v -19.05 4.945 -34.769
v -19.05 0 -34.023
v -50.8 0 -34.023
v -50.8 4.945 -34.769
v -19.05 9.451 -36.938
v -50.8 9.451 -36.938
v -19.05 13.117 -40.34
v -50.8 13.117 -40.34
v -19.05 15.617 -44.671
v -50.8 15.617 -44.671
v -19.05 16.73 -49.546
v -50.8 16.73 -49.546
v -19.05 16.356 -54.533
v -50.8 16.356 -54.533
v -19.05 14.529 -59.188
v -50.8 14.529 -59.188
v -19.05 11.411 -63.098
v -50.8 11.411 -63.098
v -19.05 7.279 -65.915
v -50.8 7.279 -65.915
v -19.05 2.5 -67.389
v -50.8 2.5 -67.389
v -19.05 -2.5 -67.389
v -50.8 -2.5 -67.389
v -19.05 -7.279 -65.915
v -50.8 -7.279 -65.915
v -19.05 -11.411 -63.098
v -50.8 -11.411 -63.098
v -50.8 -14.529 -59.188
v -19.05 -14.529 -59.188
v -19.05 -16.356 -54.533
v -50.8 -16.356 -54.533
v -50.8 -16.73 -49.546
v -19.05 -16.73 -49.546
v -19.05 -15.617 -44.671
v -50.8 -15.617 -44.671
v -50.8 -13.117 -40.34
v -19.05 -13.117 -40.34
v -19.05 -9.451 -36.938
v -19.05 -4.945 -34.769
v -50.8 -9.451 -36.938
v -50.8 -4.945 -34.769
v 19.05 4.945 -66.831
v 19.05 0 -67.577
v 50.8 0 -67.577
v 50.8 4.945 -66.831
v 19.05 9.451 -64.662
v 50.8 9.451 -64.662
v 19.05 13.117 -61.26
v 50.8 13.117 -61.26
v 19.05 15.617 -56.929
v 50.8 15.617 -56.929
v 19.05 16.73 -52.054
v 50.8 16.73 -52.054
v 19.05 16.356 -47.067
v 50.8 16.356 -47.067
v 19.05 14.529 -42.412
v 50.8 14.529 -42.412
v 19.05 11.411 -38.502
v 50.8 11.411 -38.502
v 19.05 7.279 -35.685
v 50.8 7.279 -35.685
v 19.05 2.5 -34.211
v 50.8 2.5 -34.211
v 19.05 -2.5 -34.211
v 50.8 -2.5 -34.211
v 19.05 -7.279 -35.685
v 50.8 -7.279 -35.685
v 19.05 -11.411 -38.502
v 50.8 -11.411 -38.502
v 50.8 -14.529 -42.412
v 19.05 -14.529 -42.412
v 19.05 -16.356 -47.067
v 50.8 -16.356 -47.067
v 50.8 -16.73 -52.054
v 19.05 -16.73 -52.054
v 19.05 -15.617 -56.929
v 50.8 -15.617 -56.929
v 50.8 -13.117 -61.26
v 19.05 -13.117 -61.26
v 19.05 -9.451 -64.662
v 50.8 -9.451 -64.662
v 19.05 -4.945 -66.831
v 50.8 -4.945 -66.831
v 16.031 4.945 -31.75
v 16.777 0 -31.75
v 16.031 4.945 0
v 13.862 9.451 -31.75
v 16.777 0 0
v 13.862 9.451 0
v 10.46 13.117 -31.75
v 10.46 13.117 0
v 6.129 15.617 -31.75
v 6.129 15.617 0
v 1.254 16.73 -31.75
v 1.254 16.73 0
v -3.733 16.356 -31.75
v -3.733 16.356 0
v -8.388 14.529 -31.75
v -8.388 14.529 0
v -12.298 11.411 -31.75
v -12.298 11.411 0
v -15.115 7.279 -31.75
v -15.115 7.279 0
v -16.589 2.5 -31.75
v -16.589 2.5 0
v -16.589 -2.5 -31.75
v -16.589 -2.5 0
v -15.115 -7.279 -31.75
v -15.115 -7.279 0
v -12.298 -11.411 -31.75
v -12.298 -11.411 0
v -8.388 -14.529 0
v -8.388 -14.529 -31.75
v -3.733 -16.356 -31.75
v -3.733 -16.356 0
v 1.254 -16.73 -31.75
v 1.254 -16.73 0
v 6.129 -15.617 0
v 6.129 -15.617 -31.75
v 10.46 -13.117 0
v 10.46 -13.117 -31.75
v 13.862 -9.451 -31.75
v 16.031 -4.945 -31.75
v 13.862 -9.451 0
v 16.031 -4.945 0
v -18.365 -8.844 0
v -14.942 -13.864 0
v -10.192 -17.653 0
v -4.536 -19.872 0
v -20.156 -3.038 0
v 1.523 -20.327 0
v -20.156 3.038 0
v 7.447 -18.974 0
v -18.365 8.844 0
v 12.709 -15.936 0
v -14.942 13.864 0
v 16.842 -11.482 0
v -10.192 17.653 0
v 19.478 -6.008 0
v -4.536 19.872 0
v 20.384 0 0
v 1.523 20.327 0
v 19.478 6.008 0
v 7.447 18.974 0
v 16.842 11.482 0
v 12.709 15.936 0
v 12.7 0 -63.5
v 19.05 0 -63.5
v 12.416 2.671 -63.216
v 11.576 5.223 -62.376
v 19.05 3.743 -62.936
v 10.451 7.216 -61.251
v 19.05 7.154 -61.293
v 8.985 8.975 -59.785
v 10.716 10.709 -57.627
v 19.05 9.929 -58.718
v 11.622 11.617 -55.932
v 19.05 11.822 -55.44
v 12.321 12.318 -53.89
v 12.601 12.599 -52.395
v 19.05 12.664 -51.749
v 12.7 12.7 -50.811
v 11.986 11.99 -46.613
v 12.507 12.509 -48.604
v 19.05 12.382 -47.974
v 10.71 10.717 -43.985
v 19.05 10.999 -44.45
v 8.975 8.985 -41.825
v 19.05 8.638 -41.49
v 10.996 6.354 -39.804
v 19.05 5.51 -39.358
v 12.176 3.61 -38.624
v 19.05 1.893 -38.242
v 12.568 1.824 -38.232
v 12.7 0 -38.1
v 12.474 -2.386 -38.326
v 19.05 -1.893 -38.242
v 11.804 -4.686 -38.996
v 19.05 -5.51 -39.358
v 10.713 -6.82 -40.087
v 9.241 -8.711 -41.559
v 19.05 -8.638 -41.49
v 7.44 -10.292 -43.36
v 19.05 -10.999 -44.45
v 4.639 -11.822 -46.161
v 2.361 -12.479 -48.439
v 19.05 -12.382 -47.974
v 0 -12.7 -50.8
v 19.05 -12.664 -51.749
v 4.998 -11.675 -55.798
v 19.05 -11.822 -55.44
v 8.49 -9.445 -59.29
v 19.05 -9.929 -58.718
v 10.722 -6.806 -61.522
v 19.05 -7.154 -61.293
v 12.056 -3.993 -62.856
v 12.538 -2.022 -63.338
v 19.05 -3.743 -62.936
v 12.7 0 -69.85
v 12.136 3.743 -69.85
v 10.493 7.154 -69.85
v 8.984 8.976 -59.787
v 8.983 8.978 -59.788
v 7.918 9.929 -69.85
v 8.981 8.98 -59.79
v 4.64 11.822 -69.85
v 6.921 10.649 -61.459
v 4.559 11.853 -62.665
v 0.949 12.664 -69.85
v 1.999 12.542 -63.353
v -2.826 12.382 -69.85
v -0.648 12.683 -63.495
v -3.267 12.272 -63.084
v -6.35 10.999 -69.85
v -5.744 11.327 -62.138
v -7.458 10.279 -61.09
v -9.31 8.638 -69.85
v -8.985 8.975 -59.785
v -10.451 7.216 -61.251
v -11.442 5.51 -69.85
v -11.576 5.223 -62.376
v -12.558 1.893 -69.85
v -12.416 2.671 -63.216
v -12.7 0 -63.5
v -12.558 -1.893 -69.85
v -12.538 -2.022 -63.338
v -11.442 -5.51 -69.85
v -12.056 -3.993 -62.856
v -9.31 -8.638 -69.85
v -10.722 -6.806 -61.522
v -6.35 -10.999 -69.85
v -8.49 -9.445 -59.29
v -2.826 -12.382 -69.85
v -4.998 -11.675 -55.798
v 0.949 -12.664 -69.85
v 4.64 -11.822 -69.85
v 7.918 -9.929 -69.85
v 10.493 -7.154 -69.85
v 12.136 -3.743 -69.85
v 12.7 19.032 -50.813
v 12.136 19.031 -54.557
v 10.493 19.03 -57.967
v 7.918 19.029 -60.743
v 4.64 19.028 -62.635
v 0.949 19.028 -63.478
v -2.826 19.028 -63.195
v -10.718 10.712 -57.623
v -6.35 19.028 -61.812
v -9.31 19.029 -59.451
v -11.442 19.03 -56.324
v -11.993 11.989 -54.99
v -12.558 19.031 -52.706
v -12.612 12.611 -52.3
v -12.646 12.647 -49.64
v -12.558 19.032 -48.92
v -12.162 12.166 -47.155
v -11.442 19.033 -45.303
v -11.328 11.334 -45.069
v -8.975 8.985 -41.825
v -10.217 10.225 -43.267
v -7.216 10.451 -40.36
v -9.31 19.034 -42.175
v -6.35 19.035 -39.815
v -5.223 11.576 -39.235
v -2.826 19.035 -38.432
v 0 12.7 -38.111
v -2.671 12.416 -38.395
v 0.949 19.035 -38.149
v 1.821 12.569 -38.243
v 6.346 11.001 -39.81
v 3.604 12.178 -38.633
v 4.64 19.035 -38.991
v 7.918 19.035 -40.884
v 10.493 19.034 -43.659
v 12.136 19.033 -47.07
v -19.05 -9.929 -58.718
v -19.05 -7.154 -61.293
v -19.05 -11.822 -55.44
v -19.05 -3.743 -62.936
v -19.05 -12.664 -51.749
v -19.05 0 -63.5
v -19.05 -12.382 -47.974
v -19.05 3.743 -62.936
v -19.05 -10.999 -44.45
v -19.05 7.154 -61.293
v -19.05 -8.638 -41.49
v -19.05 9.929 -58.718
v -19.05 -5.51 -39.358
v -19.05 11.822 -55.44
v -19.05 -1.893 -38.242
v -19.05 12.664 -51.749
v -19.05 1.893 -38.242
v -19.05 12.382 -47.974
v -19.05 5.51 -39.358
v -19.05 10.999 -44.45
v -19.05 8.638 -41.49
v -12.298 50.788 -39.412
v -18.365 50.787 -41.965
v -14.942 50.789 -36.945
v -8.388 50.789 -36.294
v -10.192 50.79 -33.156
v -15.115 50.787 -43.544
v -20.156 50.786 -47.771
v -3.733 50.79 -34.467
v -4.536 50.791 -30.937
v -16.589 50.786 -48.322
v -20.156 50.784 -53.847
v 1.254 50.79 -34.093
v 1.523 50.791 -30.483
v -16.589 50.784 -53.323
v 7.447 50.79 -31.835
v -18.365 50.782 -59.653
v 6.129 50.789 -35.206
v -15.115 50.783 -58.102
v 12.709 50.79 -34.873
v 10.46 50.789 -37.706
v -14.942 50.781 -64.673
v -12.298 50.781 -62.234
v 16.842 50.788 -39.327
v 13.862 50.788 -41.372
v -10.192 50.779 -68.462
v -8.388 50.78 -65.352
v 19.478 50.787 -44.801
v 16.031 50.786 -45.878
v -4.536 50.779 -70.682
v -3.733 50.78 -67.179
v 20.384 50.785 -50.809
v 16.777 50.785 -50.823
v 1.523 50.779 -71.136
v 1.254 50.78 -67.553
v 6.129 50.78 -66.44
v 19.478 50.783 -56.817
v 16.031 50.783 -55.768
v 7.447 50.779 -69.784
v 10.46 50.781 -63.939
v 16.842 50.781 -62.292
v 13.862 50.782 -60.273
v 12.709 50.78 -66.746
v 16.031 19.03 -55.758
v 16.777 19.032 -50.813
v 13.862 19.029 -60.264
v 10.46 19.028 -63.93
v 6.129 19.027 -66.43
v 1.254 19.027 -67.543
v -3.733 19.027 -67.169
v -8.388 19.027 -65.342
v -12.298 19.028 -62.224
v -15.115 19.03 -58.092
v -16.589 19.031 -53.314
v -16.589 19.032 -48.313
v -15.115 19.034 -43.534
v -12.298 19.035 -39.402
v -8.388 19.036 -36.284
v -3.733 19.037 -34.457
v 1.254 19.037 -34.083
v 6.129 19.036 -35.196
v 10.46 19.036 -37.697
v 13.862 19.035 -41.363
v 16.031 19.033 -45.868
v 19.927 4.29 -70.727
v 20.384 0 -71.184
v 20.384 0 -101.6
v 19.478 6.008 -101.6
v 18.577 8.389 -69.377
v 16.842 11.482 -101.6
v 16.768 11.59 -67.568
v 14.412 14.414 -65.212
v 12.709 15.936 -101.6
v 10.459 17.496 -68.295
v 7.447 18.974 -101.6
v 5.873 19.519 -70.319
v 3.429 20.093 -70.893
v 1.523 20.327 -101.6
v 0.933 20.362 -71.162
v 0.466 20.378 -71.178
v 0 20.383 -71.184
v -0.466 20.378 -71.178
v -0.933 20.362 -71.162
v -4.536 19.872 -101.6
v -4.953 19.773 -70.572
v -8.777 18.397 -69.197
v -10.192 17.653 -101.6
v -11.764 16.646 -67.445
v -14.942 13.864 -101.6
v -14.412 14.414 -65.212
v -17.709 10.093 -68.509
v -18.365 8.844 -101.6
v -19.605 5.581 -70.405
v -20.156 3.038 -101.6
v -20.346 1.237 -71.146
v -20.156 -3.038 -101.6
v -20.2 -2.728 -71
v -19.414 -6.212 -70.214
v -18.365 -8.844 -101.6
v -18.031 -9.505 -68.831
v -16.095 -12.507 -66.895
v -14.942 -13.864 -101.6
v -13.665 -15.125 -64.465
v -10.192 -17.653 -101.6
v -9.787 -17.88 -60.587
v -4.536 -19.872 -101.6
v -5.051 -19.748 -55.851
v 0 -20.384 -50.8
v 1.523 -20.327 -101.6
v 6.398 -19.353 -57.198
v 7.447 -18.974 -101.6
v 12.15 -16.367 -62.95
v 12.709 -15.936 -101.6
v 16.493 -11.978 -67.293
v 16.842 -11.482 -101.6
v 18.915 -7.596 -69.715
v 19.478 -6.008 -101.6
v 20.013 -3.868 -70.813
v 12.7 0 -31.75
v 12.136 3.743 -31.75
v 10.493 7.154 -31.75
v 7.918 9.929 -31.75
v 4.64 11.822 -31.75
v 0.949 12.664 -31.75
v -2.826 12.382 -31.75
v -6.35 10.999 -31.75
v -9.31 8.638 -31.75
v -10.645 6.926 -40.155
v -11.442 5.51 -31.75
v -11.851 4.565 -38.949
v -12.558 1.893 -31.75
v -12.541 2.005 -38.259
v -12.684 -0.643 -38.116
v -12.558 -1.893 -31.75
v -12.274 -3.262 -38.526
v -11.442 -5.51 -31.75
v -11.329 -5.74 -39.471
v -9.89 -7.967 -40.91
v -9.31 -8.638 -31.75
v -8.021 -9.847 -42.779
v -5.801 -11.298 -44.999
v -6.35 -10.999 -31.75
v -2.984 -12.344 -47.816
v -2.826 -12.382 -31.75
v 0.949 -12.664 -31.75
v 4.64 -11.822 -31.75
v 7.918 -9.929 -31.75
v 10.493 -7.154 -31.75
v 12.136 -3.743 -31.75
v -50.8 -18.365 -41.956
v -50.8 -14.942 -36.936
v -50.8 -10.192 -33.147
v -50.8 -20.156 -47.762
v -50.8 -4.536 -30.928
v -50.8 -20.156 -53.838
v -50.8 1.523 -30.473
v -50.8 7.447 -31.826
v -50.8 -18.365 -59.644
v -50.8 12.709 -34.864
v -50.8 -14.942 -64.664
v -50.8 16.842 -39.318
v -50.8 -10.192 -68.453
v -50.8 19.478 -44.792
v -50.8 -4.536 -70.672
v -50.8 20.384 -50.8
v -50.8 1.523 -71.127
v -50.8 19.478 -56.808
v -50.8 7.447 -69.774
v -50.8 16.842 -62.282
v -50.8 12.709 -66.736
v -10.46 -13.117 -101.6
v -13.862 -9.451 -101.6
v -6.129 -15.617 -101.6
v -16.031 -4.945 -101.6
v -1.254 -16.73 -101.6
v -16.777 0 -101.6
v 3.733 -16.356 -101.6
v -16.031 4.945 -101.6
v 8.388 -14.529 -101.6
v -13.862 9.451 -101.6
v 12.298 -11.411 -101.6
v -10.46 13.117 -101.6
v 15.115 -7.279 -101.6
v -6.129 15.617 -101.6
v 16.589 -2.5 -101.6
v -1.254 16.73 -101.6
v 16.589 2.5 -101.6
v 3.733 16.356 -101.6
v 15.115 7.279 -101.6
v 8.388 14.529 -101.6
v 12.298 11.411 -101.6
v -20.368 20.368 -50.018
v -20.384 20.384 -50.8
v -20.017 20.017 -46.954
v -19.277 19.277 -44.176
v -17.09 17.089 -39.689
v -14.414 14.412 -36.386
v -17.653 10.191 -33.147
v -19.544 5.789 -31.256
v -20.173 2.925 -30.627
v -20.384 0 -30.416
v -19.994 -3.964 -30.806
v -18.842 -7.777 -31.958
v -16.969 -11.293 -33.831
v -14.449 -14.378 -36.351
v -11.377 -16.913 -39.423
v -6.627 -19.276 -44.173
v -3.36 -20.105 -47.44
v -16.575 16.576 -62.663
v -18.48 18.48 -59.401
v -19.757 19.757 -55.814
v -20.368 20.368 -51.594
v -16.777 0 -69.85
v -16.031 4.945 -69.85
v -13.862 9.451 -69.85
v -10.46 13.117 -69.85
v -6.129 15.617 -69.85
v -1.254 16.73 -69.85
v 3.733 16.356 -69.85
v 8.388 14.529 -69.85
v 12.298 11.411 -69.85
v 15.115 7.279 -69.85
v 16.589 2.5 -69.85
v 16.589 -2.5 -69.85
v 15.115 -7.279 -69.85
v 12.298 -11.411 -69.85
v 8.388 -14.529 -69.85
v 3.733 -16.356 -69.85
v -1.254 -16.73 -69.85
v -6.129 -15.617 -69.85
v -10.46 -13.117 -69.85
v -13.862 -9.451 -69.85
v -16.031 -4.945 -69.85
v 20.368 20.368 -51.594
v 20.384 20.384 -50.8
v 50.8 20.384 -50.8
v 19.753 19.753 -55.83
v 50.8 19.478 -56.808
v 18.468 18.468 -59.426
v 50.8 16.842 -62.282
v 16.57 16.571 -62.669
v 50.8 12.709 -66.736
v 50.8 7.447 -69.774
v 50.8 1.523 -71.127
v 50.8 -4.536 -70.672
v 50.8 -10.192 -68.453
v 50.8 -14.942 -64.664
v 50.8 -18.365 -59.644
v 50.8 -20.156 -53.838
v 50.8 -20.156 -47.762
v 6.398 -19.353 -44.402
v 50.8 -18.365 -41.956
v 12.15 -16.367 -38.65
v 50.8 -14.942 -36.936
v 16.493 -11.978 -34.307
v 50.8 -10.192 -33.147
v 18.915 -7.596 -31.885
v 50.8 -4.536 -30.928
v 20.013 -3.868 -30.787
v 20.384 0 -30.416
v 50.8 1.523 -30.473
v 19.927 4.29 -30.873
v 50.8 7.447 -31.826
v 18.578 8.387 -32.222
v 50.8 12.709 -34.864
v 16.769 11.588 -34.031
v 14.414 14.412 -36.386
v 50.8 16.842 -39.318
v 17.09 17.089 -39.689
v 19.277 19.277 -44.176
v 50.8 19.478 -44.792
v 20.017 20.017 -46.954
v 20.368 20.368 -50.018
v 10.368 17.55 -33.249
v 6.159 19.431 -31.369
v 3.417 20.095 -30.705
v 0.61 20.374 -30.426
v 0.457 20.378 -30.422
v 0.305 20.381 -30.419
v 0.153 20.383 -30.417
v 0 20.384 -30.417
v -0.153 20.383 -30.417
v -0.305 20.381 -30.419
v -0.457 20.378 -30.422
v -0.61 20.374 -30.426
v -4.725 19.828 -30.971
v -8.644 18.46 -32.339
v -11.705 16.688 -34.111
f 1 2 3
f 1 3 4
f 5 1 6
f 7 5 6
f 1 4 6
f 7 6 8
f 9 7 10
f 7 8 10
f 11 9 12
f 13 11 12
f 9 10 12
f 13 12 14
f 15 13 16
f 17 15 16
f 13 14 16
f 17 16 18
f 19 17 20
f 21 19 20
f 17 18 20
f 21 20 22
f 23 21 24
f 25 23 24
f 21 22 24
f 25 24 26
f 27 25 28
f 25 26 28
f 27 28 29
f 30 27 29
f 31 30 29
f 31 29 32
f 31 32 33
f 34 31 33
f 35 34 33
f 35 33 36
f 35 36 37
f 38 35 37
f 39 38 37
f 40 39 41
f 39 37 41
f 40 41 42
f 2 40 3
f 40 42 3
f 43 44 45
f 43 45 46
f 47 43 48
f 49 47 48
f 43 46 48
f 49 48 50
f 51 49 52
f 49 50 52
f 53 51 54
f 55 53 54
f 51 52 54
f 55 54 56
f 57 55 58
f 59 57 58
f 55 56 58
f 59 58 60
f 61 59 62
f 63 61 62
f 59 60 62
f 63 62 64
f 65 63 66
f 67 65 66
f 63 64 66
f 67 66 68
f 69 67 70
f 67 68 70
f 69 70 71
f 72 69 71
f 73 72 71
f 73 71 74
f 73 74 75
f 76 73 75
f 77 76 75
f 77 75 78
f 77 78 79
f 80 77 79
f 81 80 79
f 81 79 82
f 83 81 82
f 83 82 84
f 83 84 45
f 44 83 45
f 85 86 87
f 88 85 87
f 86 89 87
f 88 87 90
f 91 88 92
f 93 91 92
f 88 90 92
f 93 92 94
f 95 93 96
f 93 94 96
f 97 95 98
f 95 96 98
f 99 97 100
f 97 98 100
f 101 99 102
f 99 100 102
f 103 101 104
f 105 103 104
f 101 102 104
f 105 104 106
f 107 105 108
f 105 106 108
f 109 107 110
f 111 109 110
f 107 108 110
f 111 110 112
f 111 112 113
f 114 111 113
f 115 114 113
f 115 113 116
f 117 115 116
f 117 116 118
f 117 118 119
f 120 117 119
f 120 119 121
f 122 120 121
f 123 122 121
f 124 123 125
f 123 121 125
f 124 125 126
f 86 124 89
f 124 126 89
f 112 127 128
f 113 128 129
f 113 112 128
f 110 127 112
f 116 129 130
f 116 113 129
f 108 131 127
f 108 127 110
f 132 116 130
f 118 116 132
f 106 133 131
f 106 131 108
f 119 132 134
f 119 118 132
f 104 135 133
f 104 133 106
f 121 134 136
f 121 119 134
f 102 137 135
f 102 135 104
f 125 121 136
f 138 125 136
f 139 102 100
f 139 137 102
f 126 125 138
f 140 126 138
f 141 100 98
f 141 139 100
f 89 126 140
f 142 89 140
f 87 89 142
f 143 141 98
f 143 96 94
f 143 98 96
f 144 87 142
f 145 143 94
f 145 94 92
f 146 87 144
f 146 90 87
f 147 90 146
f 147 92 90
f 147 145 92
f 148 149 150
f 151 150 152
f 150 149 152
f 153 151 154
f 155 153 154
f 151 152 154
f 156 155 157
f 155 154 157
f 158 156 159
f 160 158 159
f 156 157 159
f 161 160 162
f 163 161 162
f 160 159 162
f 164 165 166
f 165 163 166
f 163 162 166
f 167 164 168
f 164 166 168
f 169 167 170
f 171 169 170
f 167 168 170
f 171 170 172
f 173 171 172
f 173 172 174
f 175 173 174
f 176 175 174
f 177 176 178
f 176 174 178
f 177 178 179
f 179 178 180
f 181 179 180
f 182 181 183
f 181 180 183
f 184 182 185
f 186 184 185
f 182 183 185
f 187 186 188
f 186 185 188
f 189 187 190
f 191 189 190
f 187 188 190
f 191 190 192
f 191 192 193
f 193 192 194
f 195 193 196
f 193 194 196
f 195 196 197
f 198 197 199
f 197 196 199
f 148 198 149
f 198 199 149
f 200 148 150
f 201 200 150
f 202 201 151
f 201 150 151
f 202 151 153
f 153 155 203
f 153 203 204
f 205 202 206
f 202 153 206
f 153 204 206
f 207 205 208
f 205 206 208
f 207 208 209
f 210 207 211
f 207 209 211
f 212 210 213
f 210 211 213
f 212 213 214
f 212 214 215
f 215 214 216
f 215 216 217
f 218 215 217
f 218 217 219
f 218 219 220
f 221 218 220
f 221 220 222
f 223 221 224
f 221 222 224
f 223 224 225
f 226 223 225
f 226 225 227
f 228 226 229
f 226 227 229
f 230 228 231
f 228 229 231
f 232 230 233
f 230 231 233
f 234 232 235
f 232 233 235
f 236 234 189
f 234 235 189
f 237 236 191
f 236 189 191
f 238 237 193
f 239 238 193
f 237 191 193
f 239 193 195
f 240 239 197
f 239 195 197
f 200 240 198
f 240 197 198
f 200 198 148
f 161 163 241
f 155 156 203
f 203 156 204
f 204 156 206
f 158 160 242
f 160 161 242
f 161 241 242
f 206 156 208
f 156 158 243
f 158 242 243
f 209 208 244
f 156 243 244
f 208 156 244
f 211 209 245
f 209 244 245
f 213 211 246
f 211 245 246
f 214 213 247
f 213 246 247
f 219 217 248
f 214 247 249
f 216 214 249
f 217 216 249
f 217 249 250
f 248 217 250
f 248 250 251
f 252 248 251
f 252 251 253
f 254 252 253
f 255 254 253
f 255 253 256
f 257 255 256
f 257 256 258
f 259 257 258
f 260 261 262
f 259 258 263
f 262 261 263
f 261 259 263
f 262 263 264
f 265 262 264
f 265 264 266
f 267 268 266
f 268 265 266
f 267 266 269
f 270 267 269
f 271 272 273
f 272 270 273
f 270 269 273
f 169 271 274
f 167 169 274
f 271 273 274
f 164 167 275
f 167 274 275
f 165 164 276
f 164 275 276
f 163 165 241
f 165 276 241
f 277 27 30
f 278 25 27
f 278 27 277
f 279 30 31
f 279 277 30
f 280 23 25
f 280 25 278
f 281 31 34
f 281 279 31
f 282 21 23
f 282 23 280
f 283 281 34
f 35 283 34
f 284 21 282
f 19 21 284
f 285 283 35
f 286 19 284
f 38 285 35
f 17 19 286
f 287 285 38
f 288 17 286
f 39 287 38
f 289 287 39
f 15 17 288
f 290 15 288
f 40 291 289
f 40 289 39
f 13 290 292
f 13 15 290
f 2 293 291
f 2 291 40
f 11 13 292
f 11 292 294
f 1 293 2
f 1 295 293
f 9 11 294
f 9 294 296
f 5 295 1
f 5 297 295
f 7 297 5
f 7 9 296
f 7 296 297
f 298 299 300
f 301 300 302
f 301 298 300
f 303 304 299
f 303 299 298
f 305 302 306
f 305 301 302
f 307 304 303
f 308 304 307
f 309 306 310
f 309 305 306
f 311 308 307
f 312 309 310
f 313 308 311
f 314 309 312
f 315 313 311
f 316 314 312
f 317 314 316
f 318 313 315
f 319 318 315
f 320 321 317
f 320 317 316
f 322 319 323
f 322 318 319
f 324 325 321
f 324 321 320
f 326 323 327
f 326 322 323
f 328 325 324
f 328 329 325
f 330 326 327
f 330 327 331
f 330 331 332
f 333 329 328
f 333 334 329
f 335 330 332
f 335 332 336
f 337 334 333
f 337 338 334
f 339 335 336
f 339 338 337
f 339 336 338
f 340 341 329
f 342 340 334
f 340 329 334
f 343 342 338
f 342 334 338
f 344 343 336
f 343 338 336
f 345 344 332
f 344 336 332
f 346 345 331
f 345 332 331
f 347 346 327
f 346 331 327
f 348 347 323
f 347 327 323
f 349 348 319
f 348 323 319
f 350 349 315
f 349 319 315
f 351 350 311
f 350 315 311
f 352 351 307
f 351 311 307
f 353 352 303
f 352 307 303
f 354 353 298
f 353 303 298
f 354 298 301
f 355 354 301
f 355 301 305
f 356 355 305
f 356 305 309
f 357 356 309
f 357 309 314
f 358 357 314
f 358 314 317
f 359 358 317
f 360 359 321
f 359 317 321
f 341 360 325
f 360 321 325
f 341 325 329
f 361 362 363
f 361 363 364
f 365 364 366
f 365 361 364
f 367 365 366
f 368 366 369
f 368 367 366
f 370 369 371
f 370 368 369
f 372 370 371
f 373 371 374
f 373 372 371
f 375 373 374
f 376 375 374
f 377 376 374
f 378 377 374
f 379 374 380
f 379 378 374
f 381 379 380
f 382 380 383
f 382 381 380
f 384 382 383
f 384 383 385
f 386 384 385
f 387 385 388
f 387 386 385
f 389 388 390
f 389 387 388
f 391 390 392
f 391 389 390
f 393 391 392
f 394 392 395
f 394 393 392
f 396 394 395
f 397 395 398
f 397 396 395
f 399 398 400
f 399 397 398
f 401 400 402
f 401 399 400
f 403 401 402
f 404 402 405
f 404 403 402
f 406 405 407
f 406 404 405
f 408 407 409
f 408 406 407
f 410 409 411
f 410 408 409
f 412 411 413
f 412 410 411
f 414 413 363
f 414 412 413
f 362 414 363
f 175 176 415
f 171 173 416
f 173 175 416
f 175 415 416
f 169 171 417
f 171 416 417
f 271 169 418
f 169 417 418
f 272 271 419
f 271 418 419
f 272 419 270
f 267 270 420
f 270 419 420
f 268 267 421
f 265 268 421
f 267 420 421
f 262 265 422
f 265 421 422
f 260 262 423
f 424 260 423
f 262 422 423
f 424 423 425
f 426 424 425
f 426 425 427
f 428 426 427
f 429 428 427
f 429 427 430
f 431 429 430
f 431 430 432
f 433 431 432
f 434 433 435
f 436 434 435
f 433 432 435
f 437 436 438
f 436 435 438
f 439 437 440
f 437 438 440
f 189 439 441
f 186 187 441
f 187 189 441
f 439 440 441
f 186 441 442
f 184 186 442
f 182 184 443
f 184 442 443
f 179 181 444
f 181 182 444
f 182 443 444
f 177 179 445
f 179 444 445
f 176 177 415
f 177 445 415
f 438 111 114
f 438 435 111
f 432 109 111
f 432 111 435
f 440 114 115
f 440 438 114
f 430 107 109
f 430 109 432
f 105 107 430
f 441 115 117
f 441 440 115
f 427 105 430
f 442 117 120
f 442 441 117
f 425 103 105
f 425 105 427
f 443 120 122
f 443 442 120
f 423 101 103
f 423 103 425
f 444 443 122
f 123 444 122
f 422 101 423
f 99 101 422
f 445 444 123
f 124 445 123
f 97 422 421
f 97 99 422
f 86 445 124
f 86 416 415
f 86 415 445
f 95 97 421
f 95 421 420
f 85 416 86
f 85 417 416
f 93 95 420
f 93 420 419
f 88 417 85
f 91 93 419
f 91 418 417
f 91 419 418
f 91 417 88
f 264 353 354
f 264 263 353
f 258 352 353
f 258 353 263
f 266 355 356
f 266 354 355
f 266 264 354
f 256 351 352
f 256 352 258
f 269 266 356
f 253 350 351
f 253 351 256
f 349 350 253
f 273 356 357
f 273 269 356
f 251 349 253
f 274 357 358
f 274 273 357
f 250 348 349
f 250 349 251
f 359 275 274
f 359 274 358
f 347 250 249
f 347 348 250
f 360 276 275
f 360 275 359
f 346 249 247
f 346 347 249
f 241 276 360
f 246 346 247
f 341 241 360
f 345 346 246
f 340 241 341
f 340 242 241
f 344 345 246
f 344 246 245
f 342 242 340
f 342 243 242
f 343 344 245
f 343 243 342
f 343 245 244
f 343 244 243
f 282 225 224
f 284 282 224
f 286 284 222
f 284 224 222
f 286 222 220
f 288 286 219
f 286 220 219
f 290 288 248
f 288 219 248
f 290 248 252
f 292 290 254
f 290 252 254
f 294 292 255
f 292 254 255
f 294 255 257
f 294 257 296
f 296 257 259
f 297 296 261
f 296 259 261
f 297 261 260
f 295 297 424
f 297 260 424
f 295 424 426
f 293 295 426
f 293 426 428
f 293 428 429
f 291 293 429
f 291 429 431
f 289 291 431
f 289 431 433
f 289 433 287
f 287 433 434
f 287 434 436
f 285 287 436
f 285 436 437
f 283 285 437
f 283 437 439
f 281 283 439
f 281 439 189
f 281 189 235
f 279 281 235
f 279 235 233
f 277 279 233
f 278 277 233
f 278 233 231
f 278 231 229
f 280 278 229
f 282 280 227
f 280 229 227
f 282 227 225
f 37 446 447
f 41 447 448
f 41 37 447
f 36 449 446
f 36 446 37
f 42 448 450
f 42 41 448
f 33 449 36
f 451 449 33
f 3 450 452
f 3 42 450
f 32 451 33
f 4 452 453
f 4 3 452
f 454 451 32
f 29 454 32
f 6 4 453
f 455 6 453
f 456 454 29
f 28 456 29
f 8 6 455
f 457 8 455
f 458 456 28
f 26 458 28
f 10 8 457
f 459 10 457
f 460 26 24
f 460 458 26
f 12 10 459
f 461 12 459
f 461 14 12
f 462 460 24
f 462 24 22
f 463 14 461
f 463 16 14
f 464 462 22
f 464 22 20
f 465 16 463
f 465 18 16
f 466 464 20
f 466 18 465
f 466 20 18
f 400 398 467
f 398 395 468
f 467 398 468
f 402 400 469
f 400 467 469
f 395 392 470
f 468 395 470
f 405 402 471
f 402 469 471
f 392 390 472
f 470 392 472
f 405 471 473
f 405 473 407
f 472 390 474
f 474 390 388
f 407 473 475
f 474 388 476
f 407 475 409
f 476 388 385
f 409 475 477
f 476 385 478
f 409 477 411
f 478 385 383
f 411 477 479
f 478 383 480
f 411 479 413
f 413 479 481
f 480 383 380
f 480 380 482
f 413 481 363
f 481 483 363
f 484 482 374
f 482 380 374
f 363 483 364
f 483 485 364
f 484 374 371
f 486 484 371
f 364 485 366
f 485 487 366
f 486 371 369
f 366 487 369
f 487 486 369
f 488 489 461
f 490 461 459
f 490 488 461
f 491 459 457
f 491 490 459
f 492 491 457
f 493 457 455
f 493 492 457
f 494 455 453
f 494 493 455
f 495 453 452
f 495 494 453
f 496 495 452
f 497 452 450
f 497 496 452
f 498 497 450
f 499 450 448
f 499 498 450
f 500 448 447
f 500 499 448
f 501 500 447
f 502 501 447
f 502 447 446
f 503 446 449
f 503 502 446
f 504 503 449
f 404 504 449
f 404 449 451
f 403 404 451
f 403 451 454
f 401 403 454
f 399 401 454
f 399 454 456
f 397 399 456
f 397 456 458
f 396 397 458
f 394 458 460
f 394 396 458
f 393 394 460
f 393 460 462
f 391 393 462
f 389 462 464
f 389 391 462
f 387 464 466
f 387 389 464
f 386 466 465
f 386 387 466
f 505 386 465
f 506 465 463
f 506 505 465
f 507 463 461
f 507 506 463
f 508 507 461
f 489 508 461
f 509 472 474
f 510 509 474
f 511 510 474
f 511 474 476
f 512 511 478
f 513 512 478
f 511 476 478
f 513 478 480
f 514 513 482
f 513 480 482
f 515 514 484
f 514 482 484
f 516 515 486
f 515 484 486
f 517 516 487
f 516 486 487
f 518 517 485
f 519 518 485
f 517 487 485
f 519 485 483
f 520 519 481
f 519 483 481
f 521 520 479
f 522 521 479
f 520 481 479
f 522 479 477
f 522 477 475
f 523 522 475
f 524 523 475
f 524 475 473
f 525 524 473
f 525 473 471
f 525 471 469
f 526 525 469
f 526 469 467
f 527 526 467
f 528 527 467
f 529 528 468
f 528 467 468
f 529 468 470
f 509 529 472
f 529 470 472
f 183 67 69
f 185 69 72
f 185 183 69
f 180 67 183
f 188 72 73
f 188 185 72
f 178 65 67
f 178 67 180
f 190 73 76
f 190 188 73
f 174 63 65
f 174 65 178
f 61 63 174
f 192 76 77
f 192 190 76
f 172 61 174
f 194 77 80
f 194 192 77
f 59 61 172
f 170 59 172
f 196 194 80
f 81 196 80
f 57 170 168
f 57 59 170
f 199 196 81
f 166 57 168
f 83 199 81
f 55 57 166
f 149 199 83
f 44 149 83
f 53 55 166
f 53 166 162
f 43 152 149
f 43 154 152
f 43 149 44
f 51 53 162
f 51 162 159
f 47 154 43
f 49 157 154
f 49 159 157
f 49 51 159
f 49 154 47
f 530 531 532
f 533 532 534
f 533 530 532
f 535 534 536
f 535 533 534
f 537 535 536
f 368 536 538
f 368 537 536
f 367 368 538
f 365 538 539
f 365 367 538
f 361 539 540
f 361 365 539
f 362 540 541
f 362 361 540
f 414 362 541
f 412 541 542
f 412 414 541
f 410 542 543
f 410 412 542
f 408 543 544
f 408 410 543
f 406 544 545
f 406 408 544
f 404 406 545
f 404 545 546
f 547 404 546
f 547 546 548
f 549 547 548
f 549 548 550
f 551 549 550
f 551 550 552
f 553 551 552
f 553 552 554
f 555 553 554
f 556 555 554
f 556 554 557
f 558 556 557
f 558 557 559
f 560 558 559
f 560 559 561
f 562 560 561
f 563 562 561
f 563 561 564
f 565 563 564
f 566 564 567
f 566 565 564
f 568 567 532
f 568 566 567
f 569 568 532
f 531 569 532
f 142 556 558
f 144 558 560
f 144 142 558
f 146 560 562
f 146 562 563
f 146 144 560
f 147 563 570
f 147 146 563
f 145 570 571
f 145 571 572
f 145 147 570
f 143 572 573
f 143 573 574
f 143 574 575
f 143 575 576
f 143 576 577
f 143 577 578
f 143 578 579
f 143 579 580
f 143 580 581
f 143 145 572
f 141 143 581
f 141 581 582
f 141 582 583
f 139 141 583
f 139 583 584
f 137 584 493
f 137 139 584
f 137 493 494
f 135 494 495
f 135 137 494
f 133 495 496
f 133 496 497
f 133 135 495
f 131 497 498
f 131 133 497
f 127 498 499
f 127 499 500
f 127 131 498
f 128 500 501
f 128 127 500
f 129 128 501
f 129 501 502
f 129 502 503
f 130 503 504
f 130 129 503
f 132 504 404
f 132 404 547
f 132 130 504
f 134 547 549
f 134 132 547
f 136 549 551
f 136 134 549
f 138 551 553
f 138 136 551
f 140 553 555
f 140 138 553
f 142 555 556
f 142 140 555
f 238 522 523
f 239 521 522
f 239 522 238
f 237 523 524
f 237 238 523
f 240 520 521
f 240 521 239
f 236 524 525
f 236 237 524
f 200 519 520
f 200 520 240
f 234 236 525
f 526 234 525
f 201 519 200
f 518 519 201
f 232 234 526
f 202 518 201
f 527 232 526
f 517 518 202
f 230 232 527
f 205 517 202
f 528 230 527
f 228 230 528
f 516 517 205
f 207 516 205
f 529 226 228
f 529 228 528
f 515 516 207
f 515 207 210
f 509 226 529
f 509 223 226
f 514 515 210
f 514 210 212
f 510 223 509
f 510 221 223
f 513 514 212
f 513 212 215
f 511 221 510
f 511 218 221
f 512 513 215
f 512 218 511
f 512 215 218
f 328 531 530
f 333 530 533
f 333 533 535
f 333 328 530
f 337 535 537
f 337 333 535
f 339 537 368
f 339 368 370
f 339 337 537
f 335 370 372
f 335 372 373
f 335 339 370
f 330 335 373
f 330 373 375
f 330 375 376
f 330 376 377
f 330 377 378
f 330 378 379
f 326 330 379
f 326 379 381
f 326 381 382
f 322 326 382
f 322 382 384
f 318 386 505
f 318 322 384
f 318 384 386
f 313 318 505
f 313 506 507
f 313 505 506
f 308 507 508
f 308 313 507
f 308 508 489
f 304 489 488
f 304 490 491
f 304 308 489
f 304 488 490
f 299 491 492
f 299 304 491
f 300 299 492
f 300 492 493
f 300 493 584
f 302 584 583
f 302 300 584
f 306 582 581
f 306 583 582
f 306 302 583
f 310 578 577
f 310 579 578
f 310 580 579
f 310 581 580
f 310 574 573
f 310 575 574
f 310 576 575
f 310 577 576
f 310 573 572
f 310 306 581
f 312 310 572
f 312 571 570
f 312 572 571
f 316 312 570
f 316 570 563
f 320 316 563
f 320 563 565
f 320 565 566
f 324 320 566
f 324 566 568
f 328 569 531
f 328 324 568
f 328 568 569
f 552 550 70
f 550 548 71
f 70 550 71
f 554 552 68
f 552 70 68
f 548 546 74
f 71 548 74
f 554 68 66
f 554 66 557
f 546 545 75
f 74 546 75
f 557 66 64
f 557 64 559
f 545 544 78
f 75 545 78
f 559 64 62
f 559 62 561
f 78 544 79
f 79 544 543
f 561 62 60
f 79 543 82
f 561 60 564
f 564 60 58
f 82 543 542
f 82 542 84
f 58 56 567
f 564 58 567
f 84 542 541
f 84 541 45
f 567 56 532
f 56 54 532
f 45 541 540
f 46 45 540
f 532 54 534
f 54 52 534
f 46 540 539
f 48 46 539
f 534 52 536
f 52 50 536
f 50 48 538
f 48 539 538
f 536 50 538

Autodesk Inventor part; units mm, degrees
ref_plane "YZ Plane" through (0, 0, 0) normal (1, 0, 0) x (0, 1, 0)
sketch "Sketch1" plane through (0, 0, 0) normal (0, 0, 1) x (1, 0, 0)
  circle A0 centre (0, 0) radius 20.3835
  dimension "d0" = 40.767
extrude "Extrusion1" add sketch "Sketch1" against normal blind 101.6
sketch "Sketch2" plane through (0, 0, 0) normal (0, 0, 1) x (1, 0, 0)
  line L0 (0, 0) -> (0, 19.704)
sketch "Sketch3" plane through (0, 0, -101.6) normal (0, 0, -1) x (-1, 0, 0)
  line L0 (0, 0) -> (0, 20.098)
sketch "Sketch11" plane through (0, 0, 0) normal (0, 0, 1) x (1, 0, 0)
  circle A0 centre (0, 0) radius 20.3835 projected
  line L0 (0, 20.3835) -> (23.5166, 20.3835)
sketch "Sketch12" plane through (0, 0, -101.6) normal (0, 0, -1) x (-1, 0, 0)
  line L0 (0, 20.3509) -> (-24.2704, 20.3509)
  point P0 (0, 0)
ref_plane "Work Plane1" through (0, 0, 0) normal (-1, 0, 0) x (0, 1, 0)
ref_plane "Work Plane2" through (0, 20.3835, 0) normal (0, 1, -0.0003) x (1, 0, 0)
sketch "Sketch4" plane through (0, 0, 0) normal (-1, 0, 0) x (0, 1, 0)
  circle A0 centre (0, 50.8) radius 20.3835
  point P0 (0, 0)
extrude "Extrusion2" add sketch "Sketch4" along normal mid plane 101.6
sketch "Sketch13" plane through (0, 20.3835, 0) normal (0, 1, -0.0003) x (1, 0, 0)
  ellipse E0 centre (0, 50.8065) end of major axis (20.3835, 30.423) minor radius 0.0046 (0, 50.8131) -> (0, 50.8) ccw projected
  circle A0 centre (0, 50.8) radius 20.3835
  point P0 (0, 0.0065)
  dimension "d23" = 40.767
extrude "Extrusion9" add sketch "Sketch13" along normal blind 30.4165 and the other way blind 20.3835
sketch "Sketch5" plane through (0, 0, 0) normal (0, 0, 1) x (1, 0, 0)
  circle A0 centre (0, 0) radius 16.7767
  dimension "d5" = 33.5534
sketch "Sketch6" plane through (50.8, 0, -50.8) normal (1, 0, 0) x (0, 0, -1)
  circle A0 centre (0, 0) radius 16.7767
  point P0 (-50.8, 0)
  dimension "d6" = 33.5534
sketch "Sketch7" plane through (0, 0, -101.6) normal (0, 0, -1) x (-1, 0, 0)
  circle A0 centre (0, 0) radius 20.3835 projected
  circle A1 centre (0, 0) radius 16.7767
  dimension "d7" = 33.5534
sketch "Sketch8" plane through (-50.8, 0, -50.8) normal (-1, 0, 0) x (0, 0, 1)
  circle A0 centre (0, 0) radius 16.7767
  point P0 (50.8, 0)
  dimension "d8" = 33.5534
extrude "Extrusion3" cut sketch "Sketch5" against normal blind 31.75
extrude "Extrusion4" cut sketch "Sketch6" against normal blind 31.75
extrude "Extrusion5" cut sketch "Sketch7" against normal blind 31.75 contours A1
extrude "Extrusion6" cut sketch "Sketch8" against normal blind 31.75
sketch "Sketch9" plane through (0, 0, 0) normal (0, 0, 1) x (1, 0, 0)
  circle A0 centre (0, 0) radius 12.7
  dimension "d17" = 25.4
sketch "Sketch10" plane through (50.8, 0, -50.8) normal (1, 0, 0) x (0, 0, -1)
  circle A0 centre (0, 0) radius 12.7
  point P0 (-50.8, 0)
  dimension "d18" = 25.4
extrude "Extrusion7" cut sketch "Sketch10" against normal blind 101.6
extrude "Extrusion8" cut sketch "Sketch9" against normal blind 101.6
sketch "Sketch14" plane through (0, 50.7837, -50.8097) normal (0, 1, -0.0003) x (1, 0, 0)
  ellipse E0 centre (0, 0.0065) end of major axis (20.3835, -20.377) minor radius 0.0046 (0, 0.0131) -> (-14.4124, 14.4143) ccw projected
  circle A0 centre (0, 0.0131) radius 16.7767
  point P0 (0, -50.7935)
  dimension "d28" = 33.5534
extrude "Extrusion10" cut sketch "Sketch14" against normal blind 31.75
sketch "Sketch15" plane through (0, 50.7837, -50.8097) normal (0, 1, -0.0003) x (1, 0, 0)
  ellipse E0 centre (0, 0.0065) end of major axis (-20.3835, -20.377) minor radius 0.0046 (14.4124, 14.4143) -> (0, 0.0131) ccw projected
  circle A0 centre (0, 0.0131) radius 12.7
  point P0 (0, -50.7935)
  dimension "d31" = 25.4
extrude "Extrusion11" cut sketch "Sketch15" against normal blind 50.8
properties part number "5-way 1 Inch"
